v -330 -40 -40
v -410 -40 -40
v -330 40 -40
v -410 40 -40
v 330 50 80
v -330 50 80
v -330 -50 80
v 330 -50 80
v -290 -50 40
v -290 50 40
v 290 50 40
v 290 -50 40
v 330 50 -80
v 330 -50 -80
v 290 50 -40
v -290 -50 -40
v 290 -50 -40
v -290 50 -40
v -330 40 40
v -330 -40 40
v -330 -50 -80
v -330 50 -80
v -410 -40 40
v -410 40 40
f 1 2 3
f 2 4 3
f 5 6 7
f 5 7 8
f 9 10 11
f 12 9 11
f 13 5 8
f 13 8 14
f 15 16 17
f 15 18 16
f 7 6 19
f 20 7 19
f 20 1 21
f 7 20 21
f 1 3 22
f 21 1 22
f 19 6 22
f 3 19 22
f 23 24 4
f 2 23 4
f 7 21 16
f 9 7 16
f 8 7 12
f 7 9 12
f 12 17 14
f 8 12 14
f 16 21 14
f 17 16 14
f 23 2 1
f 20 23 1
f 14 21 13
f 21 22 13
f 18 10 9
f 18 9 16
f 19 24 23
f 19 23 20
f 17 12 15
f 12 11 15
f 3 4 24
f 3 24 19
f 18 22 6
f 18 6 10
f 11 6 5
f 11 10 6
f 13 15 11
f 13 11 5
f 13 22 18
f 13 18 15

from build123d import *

# Parameters (mm, degrees)
BOSS_EXTRUDE1_DEPTH      = 50
BOSS_EXTRUDE1_DEPTH_BACK = 50
SKETCH1_W                = 580
SKETCH1_H                = 80
BOSS_EXTRUDE2_DEPTH      = 40
BOSS_EXTRUDE2_DEPTH_BACK = 40
SKETCH1_3_W              = 80
SKETCH1_3_H              = 80


with BuildPart() as part:
    # Sketch1 → Boss-Extrude1 (new, two sides: drawn at the far end of the back side and taken through both)
    with BuildSketch(Plane(origin=(0, 0, 0), x_dir=(1, 0, 0), z_dir=(0, 1, 0)).offset(-BOSS_EXTRUDE1_DEPTH_BACK)):
        Polygon((330, 80), (-330, 80), (-330, 40), (-330, -40), (-330, -80), (330, -80), align=None)
        Rectangle(SKETCH1_W, SKETCH1_H, mode=Mode.SUBTRACT)
    extrude(amount=BOSS_EXTRUDE1_DEPTH + BOSS_EXTRUDE1_DEPTH_BACK)

    # Sketch1<3> → Boss-Extrude2 (add, two sides: drawn at the far end of the back side and taken through both)
    with BuildSketch(Plane(origin=(0, 0, 0), x_dir=(1, 0, 0), z_dir=(0, 1, 0)).offset(-BOSS_EXTRUDE2_DEPTH_BACK)):
        with Locations((-370, 0)):
            Rectangle(SKETCH1_3_W, SKETCH1_3_H)
    extrude(amount=BOSS_EXTRUDE2_DEPTH + BOSS_EXTRUDE2_DEPTH_BACK)


solid = part.part
